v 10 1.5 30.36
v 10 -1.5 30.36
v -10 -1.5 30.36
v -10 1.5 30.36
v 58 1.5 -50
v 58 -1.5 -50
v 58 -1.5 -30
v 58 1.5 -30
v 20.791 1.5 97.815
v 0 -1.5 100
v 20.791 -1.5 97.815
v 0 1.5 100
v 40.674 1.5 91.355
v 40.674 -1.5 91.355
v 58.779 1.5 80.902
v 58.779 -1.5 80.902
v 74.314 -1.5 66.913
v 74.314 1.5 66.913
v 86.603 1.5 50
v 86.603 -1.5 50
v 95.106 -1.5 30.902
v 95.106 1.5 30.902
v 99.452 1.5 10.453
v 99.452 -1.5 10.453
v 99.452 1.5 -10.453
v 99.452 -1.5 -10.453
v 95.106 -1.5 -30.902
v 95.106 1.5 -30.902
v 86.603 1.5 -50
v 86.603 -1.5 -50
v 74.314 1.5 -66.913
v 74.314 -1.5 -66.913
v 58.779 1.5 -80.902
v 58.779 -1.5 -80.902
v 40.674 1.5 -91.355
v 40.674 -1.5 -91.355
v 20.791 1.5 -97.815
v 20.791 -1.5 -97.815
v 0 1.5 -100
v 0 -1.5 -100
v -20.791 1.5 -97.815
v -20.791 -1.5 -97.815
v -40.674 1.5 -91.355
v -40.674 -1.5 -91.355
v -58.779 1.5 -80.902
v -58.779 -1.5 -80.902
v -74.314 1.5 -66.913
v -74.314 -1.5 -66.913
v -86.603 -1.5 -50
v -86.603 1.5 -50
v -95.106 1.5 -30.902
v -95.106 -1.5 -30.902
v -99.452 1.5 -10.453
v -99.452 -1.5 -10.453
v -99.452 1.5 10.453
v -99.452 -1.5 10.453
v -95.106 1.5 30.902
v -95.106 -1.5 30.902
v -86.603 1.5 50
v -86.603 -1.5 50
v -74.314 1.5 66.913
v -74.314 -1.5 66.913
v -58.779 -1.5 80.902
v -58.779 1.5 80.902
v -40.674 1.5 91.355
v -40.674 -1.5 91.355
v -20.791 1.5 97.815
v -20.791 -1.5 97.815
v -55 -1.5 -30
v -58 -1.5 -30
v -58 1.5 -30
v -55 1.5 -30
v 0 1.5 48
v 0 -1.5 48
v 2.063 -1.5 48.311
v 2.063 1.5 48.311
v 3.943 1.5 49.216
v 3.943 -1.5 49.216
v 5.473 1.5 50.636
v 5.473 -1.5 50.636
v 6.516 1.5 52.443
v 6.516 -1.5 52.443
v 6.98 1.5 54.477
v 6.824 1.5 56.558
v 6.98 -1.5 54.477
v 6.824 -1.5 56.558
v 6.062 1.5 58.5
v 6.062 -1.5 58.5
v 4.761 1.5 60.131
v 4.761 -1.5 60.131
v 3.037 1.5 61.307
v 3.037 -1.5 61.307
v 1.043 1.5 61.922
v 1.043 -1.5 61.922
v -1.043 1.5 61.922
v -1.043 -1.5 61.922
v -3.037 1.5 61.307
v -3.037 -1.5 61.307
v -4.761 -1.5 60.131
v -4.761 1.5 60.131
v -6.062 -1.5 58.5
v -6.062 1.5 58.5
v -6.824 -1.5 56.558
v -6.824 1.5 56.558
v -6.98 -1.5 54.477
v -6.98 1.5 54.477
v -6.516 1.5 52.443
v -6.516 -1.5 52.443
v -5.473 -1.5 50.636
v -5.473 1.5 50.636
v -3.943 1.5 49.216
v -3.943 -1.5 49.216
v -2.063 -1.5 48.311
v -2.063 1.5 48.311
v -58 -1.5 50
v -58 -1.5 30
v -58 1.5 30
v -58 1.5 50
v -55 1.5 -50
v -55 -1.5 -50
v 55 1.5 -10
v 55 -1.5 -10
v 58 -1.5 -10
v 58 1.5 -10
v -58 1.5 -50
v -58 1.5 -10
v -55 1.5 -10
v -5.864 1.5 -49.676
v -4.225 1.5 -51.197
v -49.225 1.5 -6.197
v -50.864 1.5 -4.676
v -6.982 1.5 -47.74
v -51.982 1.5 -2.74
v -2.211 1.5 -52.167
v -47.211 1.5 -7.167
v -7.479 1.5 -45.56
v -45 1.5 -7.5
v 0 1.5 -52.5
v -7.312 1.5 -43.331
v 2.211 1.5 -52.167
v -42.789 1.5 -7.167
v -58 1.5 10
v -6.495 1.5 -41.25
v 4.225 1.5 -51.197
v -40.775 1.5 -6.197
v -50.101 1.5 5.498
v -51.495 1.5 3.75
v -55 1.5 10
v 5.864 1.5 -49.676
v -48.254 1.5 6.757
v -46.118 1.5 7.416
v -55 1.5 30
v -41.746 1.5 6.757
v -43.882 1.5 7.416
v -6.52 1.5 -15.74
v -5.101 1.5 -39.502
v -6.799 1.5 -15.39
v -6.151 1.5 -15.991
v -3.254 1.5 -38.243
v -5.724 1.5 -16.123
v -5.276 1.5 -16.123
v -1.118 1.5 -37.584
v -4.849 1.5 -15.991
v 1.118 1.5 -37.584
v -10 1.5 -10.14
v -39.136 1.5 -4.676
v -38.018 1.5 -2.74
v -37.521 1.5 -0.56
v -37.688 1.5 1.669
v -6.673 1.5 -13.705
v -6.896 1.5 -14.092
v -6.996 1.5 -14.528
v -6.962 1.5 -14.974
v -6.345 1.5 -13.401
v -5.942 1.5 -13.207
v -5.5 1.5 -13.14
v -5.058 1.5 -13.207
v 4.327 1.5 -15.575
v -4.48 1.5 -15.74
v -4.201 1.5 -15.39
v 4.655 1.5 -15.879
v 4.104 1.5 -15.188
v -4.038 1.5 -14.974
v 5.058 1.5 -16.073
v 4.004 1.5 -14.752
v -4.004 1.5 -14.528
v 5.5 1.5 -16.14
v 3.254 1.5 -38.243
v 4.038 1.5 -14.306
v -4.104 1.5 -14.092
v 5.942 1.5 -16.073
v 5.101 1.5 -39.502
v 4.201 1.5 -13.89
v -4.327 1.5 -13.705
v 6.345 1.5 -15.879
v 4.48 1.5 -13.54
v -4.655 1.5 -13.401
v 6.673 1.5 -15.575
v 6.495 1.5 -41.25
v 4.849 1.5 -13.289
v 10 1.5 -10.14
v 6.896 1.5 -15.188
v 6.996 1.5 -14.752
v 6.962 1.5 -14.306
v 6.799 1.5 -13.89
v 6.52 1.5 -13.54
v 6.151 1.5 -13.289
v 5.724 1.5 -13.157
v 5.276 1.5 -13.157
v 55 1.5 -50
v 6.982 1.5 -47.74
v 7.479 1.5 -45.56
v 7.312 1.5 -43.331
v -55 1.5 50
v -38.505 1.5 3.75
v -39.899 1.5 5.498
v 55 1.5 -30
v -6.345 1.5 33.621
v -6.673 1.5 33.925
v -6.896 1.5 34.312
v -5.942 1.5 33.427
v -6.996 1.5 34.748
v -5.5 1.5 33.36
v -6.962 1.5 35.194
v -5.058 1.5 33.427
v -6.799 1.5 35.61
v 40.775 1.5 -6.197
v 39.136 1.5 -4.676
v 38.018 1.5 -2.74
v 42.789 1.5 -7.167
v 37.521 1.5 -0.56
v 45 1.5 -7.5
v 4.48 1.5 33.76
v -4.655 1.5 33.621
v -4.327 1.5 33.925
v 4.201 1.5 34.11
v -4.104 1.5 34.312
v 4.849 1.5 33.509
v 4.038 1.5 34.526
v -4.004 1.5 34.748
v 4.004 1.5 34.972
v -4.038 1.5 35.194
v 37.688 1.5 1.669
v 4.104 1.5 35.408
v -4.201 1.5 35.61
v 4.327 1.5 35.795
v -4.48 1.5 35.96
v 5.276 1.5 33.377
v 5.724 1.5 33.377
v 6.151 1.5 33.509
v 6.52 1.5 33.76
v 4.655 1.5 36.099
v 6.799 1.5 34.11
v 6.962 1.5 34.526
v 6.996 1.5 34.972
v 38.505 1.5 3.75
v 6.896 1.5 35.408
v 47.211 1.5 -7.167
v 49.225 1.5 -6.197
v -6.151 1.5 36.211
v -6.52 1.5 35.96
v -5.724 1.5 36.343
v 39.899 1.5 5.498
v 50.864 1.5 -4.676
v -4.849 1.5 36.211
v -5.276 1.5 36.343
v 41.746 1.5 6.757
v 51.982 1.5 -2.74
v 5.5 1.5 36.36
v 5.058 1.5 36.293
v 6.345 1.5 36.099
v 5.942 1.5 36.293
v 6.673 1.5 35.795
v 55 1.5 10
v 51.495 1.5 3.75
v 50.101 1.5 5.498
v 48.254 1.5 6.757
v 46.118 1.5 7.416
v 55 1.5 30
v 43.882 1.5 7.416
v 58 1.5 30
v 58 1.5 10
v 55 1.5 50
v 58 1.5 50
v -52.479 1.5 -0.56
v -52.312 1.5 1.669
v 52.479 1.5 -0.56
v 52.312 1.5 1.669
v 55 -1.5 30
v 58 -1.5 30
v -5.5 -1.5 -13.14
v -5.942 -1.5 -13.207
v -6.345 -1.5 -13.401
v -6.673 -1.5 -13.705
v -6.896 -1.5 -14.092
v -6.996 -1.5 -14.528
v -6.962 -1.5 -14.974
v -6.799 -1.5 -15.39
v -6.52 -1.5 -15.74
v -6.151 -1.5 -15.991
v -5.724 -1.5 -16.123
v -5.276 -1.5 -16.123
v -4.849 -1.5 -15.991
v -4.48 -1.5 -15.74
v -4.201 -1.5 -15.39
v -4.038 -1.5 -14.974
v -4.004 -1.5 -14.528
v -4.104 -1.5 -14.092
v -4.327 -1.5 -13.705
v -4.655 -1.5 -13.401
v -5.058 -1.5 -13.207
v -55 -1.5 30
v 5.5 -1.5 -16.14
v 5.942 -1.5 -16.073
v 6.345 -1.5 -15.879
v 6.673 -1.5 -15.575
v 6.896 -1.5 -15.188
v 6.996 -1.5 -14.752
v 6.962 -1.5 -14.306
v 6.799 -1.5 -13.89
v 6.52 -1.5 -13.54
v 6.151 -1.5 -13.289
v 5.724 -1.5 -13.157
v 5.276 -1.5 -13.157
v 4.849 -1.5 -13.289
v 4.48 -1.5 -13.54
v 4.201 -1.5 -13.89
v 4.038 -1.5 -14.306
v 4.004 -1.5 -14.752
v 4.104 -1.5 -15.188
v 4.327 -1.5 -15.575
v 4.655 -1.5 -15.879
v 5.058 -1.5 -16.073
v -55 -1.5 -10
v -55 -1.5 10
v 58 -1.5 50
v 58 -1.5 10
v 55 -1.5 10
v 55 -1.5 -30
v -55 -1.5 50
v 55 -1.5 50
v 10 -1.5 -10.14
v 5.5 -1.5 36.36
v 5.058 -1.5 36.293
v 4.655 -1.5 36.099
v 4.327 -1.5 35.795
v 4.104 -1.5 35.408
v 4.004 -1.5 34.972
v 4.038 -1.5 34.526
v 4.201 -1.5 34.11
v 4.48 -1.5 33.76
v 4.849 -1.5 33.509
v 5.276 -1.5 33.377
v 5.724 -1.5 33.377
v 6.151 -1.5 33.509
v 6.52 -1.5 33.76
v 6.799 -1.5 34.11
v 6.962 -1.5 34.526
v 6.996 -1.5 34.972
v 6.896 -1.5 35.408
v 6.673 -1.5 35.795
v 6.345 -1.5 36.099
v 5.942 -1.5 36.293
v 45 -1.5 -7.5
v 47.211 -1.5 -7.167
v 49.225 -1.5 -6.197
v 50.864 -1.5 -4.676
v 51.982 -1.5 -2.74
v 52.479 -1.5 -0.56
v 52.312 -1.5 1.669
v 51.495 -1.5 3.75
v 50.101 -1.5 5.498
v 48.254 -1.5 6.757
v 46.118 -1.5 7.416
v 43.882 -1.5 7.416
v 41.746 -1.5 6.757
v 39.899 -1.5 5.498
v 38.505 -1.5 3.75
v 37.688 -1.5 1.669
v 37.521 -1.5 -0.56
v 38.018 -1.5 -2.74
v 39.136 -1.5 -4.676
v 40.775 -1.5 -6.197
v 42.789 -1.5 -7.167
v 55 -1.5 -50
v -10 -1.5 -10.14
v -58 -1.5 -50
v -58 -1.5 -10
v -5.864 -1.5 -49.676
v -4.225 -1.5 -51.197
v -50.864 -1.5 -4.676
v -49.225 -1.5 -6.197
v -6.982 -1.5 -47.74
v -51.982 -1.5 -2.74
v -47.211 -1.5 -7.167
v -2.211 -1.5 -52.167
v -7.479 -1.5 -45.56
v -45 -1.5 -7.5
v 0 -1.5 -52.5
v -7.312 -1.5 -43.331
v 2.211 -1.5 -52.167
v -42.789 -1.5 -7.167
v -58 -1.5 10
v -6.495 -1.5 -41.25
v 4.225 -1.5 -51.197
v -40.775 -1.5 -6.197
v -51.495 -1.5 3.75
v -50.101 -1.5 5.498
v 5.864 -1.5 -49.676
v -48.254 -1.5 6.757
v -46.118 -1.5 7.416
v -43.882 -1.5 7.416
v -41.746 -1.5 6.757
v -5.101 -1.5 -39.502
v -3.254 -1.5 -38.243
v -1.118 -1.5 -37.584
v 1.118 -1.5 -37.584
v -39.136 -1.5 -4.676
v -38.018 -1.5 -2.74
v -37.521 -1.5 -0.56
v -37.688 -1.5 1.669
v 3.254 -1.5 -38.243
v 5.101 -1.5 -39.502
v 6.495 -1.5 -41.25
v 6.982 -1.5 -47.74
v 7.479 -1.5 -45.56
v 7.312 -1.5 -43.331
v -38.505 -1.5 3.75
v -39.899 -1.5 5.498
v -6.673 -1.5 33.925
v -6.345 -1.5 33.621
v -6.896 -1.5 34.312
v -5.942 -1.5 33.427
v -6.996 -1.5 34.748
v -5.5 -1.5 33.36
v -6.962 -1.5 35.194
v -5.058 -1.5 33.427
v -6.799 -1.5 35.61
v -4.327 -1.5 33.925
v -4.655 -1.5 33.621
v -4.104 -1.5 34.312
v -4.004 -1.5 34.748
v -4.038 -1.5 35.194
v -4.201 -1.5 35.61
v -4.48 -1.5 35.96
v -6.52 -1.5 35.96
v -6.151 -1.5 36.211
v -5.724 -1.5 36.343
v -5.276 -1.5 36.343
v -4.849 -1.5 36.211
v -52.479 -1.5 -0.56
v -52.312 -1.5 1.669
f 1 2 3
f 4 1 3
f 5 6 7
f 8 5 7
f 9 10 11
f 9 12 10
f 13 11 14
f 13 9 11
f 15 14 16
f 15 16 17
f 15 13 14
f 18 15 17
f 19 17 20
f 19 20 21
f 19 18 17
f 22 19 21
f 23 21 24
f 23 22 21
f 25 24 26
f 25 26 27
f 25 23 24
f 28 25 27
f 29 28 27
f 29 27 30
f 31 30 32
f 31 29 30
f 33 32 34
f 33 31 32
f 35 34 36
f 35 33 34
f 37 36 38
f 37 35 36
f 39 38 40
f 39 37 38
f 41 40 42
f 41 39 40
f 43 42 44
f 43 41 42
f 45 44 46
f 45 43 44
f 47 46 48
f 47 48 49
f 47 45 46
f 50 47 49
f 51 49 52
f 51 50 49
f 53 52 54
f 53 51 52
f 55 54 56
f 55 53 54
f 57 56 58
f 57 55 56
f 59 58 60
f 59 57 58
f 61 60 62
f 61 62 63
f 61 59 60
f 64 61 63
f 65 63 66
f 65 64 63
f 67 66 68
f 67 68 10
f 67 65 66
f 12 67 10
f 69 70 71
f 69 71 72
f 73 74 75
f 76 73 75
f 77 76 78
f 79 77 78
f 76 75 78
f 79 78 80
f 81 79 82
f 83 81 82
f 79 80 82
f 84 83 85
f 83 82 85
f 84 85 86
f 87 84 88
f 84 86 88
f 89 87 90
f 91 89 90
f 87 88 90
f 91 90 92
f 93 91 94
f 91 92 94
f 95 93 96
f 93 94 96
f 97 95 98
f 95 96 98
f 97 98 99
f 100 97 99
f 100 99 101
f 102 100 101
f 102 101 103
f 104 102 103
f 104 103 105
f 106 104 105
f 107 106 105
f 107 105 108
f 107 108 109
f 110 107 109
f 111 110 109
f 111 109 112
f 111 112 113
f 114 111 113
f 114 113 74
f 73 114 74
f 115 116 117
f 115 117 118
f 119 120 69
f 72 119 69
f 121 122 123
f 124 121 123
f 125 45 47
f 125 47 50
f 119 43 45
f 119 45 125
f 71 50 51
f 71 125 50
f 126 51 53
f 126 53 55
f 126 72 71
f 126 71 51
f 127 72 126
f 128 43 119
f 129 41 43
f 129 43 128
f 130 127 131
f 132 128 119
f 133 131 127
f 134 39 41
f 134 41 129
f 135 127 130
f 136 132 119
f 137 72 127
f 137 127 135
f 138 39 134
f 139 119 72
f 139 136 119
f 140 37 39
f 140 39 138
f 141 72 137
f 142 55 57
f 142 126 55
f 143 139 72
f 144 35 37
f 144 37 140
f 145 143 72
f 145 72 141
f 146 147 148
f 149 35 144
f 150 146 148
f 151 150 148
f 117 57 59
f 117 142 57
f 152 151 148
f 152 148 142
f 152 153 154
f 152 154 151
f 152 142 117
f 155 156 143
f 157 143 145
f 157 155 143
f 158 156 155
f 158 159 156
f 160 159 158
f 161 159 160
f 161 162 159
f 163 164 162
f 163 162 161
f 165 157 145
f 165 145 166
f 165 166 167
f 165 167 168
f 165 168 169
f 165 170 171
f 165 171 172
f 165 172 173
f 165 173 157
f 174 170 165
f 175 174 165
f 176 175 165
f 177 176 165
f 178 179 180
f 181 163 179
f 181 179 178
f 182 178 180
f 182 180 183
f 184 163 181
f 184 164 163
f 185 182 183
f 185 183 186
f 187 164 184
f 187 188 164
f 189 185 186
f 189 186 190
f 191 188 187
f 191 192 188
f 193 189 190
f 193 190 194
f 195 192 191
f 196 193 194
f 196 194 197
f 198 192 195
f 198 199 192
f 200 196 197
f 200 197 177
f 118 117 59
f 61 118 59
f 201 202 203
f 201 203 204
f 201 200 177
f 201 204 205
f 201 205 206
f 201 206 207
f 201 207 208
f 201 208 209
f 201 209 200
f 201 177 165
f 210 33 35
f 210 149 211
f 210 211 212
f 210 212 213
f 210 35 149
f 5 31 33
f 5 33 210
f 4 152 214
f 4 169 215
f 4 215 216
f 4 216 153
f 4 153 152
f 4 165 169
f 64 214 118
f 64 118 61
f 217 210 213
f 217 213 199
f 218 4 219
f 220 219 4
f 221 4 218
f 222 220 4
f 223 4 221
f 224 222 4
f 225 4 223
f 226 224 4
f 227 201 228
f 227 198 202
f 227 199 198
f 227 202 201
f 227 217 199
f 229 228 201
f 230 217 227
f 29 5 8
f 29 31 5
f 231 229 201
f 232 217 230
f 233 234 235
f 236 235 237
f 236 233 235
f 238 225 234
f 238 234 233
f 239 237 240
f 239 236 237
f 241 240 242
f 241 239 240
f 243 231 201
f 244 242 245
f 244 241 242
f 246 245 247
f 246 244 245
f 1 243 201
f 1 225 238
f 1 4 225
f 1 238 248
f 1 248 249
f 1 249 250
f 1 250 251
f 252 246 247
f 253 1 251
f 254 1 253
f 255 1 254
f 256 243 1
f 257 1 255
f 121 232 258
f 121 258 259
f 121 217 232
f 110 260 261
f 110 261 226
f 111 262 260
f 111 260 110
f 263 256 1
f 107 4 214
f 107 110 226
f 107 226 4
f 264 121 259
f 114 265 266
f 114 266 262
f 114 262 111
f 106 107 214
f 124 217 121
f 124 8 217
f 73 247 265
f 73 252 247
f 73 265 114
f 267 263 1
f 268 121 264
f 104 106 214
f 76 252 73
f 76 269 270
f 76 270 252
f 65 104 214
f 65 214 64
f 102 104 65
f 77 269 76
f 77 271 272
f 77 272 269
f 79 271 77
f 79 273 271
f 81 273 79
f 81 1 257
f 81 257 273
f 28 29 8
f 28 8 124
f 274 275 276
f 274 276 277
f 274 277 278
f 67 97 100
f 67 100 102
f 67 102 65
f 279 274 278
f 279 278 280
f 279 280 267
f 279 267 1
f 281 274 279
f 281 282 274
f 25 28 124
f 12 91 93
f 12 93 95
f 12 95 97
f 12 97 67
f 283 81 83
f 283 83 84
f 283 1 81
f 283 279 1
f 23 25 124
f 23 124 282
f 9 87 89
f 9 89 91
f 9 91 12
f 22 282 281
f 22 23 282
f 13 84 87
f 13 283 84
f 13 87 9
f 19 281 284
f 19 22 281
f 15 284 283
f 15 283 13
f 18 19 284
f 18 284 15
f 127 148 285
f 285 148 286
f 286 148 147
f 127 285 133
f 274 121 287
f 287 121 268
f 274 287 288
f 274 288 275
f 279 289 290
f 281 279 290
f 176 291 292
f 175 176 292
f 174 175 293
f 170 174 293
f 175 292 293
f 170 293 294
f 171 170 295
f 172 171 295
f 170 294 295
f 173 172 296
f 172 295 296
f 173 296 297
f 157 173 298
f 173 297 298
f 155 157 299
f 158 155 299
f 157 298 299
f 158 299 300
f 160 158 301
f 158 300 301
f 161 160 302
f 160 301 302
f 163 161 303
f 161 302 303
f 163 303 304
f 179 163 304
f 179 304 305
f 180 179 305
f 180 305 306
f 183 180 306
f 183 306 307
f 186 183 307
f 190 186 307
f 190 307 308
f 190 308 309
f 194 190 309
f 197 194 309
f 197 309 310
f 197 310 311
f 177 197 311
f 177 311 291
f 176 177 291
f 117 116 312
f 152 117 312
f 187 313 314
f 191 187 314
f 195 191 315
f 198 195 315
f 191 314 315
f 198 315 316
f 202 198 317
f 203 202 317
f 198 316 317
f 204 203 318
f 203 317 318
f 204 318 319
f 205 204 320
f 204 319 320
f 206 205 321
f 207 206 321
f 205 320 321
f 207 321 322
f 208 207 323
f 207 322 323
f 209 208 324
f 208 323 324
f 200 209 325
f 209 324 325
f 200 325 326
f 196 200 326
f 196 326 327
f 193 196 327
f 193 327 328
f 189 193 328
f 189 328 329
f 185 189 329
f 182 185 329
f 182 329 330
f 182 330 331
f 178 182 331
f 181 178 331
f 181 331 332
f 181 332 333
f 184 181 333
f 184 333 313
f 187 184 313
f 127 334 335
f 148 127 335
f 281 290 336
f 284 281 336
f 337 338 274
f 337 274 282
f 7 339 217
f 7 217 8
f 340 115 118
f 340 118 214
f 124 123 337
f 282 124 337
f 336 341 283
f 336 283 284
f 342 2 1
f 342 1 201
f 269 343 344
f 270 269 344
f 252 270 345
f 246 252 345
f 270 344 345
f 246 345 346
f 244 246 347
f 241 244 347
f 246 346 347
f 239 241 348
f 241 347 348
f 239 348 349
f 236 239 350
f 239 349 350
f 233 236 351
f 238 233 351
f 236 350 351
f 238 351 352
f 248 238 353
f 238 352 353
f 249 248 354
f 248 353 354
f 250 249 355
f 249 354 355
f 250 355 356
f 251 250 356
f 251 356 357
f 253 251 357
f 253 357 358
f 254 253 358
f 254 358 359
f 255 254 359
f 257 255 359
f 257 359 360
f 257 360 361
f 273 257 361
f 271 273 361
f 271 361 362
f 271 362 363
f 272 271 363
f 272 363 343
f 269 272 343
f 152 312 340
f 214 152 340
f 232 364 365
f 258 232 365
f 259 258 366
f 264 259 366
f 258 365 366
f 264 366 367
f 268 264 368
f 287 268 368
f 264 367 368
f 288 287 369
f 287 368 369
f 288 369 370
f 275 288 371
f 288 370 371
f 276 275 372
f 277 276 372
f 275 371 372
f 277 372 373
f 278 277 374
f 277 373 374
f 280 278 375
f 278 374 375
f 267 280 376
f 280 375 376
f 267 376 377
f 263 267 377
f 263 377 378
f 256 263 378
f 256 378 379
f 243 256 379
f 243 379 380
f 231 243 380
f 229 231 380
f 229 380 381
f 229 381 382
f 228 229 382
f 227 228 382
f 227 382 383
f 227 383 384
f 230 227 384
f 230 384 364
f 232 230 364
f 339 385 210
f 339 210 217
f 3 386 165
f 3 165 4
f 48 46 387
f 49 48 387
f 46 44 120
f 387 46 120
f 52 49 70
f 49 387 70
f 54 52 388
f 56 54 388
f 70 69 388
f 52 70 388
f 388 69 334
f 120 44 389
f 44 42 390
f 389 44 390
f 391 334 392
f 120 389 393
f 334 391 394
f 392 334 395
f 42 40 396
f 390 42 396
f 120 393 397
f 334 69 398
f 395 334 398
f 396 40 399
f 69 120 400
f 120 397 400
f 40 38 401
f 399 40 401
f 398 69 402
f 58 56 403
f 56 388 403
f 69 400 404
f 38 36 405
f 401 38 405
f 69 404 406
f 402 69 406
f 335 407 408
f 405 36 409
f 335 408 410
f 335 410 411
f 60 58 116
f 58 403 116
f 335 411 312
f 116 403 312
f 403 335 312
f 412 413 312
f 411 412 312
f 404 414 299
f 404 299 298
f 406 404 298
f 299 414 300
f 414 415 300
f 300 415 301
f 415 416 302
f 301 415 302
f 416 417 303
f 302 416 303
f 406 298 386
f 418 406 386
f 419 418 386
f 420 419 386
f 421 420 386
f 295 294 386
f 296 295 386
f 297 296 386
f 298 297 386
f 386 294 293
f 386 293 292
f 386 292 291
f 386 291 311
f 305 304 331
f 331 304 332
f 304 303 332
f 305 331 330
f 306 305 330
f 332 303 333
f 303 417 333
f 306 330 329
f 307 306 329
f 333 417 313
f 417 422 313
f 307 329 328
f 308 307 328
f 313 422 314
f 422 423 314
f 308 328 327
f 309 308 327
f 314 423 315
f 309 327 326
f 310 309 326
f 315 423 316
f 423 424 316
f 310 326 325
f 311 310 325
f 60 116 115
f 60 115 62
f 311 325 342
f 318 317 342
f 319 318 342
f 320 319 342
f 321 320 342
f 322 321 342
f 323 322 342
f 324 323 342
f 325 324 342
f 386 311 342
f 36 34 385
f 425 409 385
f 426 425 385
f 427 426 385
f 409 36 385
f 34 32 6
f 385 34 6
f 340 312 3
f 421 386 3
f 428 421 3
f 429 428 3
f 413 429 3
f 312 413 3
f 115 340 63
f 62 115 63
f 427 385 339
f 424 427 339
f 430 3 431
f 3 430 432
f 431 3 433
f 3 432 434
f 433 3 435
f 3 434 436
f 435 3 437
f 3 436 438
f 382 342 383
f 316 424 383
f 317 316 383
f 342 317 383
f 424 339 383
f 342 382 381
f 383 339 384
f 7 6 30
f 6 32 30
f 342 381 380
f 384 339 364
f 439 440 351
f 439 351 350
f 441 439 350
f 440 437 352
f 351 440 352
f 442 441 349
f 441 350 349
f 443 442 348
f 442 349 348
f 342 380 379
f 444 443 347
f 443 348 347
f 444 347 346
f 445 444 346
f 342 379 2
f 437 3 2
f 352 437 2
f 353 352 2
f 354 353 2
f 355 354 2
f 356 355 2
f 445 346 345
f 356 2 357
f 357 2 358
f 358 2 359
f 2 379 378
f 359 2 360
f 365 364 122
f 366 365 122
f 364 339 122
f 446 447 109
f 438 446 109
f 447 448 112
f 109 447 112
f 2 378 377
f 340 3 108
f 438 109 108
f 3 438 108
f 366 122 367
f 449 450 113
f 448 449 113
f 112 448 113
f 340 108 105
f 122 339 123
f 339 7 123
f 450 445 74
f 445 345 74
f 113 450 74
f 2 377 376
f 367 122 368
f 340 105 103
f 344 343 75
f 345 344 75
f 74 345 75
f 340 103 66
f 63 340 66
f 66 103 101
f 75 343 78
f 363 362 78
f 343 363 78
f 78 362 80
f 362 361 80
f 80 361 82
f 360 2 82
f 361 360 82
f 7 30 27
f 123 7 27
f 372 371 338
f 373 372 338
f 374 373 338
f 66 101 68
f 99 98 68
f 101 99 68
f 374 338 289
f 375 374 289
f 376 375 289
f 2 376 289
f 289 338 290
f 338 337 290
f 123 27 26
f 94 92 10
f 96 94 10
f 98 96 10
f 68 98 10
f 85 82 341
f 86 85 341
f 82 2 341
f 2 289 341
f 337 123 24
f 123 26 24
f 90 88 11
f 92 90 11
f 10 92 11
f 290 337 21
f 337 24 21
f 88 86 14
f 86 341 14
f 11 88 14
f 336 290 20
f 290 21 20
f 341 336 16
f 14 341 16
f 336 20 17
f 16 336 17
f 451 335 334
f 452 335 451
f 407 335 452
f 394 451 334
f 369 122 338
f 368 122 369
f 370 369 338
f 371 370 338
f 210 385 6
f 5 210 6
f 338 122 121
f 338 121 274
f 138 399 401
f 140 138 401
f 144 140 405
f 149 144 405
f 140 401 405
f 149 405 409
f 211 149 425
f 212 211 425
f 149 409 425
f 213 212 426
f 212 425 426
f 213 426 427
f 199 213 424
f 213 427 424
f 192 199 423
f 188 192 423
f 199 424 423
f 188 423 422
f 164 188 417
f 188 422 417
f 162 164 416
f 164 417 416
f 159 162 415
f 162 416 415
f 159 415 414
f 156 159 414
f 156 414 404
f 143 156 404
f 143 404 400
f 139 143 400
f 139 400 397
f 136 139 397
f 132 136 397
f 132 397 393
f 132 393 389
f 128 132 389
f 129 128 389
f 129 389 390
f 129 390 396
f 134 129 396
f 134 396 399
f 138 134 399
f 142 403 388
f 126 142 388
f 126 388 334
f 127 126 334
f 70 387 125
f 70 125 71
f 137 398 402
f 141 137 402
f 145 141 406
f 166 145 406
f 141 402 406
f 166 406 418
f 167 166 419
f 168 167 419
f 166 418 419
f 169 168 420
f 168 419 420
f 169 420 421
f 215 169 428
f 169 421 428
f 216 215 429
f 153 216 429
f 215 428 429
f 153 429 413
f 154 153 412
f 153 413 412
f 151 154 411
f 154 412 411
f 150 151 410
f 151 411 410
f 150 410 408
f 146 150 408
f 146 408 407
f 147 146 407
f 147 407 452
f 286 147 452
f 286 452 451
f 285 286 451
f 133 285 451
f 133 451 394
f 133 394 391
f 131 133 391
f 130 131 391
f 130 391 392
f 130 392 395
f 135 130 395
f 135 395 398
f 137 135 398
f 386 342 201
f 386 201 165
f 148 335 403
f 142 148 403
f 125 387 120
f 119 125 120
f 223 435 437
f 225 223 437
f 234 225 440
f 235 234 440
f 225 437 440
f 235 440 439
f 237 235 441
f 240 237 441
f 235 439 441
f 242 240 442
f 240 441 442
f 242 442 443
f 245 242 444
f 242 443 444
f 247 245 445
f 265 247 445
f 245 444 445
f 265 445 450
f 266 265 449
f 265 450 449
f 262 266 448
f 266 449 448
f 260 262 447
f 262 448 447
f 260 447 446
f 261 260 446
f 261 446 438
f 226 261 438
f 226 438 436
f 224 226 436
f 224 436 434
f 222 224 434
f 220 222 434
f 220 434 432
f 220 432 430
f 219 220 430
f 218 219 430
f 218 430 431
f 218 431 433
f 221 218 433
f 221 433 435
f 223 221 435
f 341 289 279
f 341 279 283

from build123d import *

# Parameters (mm, degrees)
SKETCH2_R           = 100
BOSS_EXTRUDE1_DEPTH = 1.5
CUT_EXTRUDE2_DEPTH  = 10
SKETCH6_R           = 7.5
SKETCH6_R_2         = 7
CUT_EXTRUDE3_DEPTH  = 10
SKETCH3_W           = 3
SKETCH3_H           = 20
CUT_EXTRUDE4_DEPTH  = 10
SKETCH7_R           = 1.5
CUT_EXTRUDE5_DEPTH  = 10


with BuildPart() as part:
    # Sketch2 → Boss-Extrude1 (new, symmetric)
    with BuildSketch(Plane(origin=(0, 0, 0), x_dir=(1, 0, 0), z_dir=(0, 1, 0))):
        with Locations(Location((0, 0, 0), (0, 0, 270))):
            Circle(SKETCH2_R)
    extrude(amount=BOSS_EXTRUDE1_DEPTH, both=True)

    # Sketch5 → Cut-Extrude2 (cut)
    with BuildSketch(Plane.XZ.offset(1.5)):
        Polygon((0, 30.36), (10, 30.36), (10, -10.14), (-10, -10.14), (-10, 30.36), align=None)
    extrude(amount=-CUT_EXTRUDE2_DEPTH, mode=Mode.SUBTRACT)

    # Sketch6 → Cut-Extrude3 (cut)
    with BuildSketch(Plane.XZ.offset(1.5)):
        with Locations(Location((-45, 0, 0), (0, 0, 270))):
            Circle(SKETCH6_R)
        with Locations(Location((0, -45, 0), (0, 0, 270))):
            Circle(SKETCH6_R)
        with Locations(Location((45, 0, 0), (0, 0, 270))):
            Circle(SKETCH6_R)
        with Locations(Location((0, 55, 0), (0, 0, 270))):
            Circle(SKETCH6_R_2)
    extrude(amount=-CUT_EXTRUDE3_DEPTH, mode=Mode.SUBTRACT)

    # Sketch3 → Cut-Extrude4 (cut)
    with BuildSketch(Plane.XZ.offset(1.5)):
        with Locations((-56.5, 40)):
            Rectangle(SKETCH3_W, SKETCH3_H)
        Polygon((-55, -10), (-55, 0), (-55, 10), (-58, 10), (-58, 0), (-58, -10), align=None)
        with Locations((-56.5, -40)):
            Rectangle(SKETCH3_W, SKETCH3_H)
        with Locations((56.5, 40)):
            Rectangle(SKETCH3_W, SKETCH3_H)
        with Locations((56.5, 0)):
            Rectangle(SKETCH3_W, SKETCH3_H)
        with Locations((56.5, -40)):
            Rectangle(SKETCH3_W, SKETCH3_H)
    extrude(amount=-CUT_EXTRUDE4_DEPTH, mode=Mode.SUBTRACT)

    # Sketch7 → Cut-Extrude5 (cut)
    with BuildSketch(Plane(origin=(0, -1.5, 0), x_dir=(-1, 0, 0), z_dir=(0, -1, 0))):
        with Locations(Location((5.5, -34.86, 0), (0, 0, 90))):
            Circle(SKETCH7_R)
        with Locations(Location((-5.5, -34.86, 0), (0, 0, 270))):
            Circle(SKETCH7_R)
        with Locations(Location((-5.5, 14.64, 0), (0, 0, 90))):
            Circle(SKETCH7_R)
        with Locations(Location((5.5, 14.64, 0), (0, 0, 270))):
            Circle(SKETCH7_R)
    extrude(amount=-CUT_EXTRUDE5_DEPTH, mode=Mode.SUBTRACT)


solid = part.part
